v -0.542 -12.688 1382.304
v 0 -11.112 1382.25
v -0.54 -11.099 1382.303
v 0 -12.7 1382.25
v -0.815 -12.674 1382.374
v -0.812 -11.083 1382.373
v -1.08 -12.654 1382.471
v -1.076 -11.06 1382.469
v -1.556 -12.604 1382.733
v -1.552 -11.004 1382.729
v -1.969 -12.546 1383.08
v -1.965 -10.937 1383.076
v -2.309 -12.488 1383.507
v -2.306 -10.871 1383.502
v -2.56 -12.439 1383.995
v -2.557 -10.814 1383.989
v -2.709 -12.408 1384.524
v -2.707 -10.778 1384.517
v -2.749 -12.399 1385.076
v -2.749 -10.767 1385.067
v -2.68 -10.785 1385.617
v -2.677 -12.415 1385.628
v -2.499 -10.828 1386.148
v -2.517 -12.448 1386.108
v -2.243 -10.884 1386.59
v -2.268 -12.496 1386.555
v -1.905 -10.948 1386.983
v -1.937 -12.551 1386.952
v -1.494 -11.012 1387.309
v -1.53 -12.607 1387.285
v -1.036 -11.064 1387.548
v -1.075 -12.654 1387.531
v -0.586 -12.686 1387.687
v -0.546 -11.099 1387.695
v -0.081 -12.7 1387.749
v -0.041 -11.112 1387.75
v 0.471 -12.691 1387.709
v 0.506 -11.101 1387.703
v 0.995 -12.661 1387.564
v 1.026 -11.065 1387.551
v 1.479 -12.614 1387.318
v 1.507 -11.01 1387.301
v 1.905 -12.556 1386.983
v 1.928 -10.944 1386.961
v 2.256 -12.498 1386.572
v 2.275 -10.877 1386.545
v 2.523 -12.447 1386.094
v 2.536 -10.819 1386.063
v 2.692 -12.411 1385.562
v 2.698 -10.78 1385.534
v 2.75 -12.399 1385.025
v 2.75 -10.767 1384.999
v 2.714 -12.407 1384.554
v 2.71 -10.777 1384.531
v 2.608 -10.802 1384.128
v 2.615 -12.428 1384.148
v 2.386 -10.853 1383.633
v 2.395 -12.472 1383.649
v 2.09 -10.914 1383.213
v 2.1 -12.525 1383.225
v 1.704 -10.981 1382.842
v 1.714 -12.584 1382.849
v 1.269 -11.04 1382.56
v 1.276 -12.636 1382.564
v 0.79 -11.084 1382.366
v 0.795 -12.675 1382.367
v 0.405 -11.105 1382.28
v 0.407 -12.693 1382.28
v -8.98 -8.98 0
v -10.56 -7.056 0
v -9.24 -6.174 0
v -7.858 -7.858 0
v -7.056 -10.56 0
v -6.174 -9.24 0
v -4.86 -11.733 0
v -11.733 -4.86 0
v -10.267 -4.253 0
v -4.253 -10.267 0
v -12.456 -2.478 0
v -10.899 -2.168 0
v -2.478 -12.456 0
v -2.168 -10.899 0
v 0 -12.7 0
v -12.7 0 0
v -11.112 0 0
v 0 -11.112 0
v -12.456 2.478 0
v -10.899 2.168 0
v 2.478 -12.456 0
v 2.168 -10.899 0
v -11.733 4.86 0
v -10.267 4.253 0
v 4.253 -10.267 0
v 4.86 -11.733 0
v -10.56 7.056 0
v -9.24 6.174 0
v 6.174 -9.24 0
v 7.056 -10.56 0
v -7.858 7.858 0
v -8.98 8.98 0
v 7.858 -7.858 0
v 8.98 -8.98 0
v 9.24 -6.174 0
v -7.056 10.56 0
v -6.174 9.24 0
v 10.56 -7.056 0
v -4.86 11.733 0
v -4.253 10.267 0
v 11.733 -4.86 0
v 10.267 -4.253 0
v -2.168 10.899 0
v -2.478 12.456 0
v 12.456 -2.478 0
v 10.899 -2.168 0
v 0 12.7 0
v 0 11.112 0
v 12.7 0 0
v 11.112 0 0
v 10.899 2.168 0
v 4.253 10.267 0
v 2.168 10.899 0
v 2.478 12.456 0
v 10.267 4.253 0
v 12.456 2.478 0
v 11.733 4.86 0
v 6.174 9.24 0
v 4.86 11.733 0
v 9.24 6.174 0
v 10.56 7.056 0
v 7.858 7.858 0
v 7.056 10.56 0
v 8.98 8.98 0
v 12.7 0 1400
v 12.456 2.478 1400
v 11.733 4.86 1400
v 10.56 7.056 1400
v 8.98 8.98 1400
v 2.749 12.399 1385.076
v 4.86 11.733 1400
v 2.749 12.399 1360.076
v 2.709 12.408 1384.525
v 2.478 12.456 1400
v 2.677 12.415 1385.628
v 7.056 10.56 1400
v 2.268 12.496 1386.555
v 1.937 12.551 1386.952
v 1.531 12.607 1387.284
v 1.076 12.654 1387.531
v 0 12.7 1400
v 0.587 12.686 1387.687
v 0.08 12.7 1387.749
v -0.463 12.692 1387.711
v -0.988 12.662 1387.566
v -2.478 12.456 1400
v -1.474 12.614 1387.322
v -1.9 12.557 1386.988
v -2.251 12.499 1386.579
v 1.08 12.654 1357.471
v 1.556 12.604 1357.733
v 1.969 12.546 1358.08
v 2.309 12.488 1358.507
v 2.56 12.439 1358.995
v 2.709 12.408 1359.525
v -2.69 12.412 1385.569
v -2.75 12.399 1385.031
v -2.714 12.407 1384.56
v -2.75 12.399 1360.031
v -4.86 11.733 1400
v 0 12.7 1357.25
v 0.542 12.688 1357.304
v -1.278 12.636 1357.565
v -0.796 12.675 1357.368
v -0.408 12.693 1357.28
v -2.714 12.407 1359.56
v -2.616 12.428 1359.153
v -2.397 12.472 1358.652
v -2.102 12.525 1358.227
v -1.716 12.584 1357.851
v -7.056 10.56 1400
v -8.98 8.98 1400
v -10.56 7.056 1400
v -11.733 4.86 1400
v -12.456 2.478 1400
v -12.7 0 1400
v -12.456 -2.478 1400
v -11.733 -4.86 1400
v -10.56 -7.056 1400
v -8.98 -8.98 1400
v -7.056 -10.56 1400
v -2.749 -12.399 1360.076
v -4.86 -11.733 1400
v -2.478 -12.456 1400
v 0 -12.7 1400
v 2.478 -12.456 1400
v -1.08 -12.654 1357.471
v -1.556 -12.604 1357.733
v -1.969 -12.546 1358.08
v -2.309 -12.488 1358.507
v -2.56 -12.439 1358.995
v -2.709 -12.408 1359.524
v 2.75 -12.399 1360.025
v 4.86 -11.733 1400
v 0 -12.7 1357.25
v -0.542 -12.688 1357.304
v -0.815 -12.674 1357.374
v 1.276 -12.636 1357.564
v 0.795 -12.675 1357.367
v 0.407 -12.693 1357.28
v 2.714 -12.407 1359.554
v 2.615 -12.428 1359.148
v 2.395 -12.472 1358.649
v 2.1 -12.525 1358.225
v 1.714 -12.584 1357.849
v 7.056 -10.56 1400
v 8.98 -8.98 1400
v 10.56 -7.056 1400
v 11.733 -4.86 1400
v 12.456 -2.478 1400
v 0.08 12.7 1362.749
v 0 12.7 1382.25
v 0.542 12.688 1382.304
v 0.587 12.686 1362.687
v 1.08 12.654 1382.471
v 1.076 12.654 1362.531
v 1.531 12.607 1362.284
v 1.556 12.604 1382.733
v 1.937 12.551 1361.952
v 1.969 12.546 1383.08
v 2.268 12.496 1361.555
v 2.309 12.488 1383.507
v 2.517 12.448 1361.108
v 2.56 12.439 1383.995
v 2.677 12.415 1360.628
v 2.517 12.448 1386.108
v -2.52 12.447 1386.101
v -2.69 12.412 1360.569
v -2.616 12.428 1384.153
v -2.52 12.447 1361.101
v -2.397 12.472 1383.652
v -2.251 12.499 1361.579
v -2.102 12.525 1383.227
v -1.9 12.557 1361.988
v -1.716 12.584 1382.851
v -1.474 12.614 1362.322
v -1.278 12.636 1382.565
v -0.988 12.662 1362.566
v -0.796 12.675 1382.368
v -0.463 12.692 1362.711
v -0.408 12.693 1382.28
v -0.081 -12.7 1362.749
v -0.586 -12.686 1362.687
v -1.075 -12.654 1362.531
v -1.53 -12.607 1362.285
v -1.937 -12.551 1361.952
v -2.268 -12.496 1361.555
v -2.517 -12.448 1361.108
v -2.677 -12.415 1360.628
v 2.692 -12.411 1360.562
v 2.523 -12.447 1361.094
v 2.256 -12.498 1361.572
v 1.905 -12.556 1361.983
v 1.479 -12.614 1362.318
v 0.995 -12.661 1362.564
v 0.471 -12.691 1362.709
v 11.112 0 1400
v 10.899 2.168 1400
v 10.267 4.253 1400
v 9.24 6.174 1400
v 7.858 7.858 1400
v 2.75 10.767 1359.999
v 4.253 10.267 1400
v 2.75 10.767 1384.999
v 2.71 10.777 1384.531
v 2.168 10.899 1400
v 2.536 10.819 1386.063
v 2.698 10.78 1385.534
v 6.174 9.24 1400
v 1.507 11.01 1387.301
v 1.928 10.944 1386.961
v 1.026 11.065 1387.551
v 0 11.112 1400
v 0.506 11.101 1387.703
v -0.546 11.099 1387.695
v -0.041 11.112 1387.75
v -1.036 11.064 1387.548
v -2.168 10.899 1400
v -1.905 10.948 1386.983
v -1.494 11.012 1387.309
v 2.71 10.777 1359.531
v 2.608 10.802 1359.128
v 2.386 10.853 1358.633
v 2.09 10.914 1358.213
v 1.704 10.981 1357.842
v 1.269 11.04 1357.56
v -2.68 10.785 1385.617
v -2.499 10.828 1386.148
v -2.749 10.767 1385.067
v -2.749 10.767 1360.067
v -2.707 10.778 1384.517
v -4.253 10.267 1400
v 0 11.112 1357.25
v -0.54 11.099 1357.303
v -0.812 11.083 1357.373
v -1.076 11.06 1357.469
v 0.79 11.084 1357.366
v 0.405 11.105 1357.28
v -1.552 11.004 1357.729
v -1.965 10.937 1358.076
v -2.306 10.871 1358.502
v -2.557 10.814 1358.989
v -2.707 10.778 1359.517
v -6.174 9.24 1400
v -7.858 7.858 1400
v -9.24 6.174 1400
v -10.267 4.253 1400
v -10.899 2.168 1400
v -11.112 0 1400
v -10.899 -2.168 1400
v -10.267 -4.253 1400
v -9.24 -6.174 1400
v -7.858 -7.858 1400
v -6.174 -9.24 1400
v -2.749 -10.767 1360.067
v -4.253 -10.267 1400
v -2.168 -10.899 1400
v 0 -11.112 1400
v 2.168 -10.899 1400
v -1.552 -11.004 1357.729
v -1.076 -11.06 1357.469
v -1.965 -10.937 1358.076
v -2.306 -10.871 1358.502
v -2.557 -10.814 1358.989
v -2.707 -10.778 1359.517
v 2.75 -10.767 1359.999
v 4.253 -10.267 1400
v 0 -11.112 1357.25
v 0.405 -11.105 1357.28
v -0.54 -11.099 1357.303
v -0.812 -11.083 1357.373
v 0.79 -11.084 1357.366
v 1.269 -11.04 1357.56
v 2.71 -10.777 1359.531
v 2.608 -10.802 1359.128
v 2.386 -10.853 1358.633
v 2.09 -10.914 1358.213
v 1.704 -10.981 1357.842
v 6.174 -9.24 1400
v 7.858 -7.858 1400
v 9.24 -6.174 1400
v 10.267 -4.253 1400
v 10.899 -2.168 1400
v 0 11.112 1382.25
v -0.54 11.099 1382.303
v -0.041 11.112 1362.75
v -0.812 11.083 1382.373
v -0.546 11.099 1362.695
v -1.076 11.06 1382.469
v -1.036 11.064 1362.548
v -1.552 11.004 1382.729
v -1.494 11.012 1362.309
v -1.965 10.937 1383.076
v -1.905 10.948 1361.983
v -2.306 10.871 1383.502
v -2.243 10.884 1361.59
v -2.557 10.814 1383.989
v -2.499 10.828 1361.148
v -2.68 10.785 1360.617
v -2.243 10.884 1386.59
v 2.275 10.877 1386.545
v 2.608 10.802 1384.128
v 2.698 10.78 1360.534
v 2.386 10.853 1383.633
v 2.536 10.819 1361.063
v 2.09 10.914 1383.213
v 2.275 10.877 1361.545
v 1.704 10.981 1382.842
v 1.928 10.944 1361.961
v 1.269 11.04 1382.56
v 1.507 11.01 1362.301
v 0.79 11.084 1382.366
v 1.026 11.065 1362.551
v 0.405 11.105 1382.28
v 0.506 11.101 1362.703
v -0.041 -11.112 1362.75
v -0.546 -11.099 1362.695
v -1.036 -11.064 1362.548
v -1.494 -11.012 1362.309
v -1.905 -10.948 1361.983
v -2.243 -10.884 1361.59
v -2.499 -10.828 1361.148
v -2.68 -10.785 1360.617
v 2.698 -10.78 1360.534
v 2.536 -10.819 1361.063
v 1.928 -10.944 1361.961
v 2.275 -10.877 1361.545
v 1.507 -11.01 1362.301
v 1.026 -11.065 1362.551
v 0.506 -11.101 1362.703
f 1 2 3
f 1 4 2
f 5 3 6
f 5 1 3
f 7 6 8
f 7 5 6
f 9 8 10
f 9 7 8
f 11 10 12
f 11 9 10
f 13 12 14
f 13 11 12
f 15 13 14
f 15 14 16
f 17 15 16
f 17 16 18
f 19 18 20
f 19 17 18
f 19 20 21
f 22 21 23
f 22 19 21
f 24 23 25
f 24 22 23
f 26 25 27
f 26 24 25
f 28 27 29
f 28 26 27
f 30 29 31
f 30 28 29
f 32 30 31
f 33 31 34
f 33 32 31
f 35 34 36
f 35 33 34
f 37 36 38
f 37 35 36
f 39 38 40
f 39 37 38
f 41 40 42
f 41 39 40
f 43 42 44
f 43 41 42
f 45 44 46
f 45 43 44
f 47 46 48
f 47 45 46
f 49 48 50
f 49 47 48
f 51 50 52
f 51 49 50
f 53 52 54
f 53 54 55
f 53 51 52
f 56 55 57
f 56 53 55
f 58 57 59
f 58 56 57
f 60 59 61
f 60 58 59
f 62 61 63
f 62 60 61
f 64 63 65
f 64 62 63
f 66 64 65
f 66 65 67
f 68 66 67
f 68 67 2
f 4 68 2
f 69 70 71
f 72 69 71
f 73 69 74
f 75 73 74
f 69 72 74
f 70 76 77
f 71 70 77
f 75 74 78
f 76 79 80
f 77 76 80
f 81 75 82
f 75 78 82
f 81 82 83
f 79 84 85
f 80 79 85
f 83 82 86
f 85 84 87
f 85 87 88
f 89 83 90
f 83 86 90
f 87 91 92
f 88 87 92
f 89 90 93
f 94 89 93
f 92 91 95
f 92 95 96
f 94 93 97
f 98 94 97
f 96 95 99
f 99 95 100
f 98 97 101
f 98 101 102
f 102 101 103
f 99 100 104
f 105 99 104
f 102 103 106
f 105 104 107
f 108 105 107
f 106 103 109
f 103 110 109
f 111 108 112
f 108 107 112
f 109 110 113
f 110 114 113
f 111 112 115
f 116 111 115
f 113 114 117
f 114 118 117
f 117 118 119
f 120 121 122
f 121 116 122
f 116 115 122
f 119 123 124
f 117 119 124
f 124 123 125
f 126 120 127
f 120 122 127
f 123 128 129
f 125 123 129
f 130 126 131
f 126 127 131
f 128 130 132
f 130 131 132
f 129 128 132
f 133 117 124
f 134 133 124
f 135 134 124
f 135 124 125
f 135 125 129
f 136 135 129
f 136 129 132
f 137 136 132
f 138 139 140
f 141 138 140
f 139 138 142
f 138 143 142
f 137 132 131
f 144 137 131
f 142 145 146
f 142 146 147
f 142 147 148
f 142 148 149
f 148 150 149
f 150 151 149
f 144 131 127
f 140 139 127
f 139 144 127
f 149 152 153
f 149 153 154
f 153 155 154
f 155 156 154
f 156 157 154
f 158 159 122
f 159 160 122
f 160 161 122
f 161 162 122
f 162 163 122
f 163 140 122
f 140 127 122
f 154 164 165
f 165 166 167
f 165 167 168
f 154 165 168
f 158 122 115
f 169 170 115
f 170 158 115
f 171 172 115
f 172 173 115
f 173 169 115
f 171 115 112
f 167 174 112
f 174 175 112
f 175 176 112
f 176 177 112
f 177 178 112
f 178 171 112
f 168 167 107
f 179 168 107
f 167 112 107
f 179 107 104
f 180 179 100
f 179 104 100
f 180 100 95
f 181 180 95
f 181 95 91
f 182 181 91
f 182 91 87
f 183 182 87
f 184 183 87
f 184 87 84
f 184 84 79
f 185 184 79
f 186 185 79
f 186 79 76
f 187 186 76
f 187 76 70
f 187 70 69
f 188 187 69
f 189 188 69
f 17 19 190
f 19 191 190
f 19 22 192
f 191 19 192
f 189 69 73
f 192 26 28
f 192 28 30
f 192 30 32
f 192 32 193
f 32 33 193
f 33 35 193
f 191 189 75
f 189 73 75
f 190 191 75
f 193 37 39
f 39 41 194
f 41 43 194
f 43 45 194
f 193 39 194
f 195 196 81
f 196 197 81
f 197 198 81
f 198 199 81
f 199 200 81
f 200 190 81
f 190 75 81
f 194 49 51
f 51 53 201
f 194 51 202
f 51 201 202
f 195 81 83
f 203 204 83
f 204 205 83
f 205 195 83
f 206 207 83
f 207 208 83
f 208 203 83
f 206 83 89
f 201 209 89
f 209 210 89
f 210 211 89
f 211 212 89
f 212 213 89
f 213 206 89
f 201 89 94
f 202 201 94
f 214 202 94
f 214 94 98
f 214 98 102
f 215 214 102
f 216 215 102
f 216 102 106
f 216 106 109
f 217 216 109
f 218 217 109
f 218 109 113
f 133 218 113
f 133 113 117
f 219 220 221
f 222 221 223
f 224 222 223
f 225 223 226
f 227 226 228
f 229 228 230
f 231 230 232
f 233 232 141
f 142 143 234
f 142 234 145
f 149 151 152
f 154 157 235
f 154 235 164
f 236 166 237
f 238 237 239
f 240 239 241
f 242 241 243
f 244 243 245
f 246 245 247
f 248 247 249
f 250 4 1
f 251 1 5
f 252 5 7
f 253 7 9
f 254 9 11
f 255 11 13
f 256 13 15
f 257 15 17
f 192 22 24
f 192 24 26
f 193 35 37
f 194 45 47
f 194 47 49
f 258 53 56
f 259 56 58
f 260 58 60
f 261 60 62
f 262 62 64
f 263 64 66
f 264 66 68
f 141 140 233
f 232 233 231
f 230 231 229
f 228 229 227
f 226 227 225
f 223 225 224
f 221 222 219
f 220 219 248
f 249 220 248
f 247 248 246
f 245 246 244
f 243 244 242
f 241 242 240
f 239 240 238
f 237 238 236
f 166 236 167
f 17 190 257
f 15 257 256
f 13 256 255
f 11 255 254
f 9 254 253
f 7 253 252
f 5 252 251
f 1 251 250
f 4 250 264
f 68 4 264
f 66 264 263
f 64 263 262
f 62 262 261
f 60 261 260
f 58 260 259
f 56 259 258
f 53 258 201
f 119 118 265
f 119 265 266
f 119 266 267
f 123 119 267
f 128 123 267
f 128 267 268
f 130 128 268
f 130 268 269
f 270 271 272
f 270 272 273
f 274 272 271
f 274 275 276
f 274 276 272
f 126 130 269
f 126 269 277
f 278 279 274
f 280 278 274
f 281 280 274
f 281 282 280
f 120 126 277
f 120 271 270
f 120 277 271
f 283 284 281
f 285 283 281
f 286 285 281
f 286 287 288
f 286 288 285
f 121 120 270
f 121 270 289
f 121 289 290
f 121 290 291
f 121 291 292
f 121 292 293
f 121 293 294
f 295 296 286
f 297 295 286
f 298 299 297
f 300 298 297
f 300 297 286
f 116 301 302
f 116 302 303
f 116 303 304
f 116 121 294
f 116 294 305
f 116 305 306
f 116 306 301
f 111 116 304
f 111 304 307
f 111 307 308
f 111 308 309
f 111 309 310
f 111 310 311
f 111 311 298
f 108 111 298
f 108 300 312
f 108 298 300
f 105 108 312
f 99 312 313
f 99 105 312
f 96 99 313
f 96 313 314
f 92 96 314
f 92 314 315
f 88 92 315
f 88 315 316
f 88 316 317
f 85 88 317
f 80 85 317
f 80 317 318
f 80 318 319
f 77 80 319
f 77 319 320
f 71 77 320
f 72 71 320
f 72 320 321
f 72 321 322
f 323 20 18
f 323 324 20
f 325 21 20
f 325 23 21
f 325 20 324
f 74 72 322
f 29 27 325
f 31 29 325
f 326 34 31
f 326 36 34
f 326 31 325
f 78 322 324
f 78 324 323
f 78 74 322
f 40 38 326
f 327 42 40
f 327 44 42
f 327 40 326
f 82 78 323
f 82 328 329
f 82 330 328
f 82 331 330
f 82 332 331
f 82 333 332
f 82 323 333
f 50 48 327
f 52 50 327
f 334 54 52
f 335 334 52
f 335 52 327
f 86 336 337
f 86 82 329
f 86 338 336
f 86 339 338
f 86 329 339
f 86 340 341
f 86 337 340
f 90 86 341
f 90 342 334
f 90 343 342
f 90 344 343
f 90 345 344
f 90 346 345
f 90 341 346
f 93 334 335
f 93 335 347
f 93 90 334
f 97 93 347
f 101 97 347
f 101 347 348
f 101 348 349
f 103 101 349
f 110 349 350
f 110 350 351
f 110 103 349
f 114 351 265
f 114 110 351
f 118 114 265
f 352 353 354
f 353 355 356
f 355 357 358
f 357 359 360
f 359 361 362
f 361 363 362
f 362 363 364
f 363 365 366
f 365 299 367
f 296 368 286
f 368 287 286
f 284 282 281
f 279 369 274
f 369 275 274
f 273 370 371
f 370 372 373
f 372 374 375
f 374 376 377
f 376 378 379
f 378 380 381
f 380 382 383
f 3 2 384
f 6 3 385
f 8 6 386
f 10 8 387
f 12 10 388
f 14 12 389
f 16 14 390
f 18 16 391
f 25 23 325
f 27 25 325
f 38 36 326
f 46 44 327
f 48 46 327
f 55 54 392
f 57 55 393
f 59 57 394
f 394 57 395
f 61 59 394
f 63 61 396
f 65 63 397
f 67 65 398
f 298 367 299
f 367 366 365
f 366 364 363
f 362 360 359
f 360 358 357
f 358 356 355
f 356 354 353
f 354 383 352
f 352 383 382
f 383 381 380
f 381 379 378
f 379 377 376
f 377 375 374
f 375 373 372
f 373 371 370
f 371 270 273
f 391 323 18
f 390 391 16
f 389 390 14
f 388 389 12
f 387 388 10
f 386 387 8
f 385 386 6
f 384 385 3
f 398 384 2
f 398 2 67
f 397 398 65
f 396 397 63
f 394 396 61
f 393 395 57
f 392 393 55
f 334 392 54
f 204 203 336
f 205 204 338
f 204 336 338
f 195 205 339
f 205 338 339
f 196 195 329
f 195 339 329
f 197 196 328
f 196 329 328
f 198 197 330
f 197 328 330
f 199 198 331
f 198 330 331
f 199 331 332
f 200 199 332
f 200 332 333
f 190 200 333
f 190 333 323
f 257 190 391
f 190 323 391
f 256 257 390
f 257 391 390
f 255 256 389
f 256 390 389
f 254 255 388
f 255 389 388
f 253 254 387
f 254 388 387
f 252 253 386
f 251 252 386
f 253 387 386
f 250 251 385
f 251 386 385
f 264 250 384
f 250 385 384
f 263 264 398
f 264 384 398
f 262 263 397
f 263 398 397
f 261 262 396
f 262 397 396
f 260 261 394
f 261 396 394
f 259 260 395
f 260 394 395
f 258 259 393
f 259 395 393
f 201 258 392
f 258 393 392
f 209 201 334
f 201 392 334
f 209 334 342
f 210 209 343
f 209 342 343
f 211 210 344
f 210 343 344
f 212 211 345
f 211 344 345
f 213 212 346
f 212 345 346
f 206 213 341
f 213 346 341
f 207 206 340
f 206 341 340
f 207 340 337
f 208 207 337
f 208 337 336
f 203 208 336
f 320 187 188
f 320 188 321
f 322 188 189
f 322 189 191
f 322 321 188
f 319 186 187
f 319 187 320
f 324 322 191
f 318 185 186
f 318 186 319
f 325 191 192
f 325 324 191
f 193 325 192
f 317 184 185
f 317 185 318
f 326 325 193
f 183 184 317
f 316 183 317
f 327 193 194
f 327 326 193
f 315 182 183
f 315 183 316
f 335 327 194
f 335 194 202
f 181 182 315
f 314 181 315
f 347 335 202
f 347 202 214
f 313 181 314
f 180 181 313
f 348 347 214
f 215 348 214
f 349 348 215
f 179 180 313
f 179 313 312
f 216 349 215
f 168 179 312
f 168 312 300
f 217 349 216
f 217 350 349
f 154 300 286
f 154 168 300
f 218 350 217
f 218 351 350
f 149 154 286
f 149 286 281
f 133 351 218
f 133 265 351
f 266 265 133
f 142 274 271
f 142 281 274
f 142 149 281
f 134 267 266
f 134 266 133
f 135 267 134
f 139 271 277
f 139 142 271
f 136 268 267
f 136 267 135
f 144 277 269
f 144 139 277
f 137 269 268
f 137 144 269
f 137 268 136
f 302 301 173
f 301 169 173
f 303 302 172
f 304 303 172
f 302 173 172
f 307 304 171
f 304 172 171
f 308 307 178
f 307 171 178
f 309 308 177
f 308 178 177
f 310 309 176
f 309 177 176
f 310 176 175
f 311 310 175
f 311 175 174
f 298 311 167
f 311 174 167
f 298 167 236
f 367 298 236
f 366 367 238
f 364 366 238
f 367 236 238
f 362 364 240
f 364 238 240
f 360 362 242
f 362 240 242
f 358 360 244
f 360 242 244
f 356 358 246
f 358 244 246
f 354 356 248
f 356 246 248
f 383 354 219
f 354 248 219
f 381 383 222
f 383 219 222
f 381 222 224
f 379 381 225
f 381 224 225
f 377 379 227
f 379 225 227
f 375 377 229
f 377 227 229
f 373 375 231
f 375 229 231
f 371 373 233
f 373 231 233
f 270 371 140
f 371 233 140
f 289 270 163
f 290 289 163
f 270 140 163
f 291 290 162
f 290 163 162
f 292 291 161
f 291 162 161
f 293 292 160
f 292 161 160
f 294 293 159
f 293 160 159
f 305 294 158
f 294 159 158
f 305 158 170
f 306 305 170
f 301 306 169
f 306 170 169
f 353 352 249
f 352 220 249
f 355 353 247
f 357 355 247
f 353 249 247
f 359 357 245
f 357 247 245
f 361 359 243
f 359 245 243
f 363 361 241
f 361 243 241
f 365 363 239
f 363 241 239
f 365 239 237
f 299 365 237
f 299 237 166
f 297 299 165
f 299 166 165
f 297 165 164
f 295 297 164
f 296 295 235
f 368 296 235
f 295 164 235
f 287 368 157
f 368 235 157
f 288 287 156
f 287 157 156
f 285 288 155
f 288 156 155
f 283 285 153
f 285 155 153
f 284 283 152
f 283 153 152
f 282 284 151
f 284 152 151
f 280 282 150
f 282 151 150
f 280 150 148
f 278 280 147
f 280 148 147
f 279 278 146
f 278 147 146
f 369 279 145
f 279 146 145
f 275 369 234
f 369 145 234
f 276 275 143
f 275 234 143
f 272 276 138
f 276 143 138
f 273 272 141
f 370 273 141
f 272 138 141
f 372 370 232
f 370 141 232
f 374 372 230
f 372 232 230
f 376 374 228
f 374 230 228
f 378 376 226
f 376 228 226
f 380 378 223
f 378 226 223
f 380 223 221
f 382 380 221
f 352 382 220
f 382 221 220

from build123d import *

# Parameters (mm, degrees)
SKETCH2_R                     = 12.7
SKETCH2_R_2                   = 11.1125
BOSS_EXTRUDE1_DEPTH           = 1400
SKETCH6_W                     = 2.75
SKETCH6_H                     = 12.7
M5_CLEARANCE_HOLE1_AT_2_COUNT = 2
M5_CLEARANCE_HOLE1_AT_2_PITCH = 25
MIRROR1_COPY_1_SKETCH_W       = 2.75
MIRROR1_COPY_1_SKETCH_H       = 12.7


with BuildPart() as part:
    # Sketch2 → Boss-Extrude1 (new body)
    with BuildSketch(Plane.XY):
        Circle(SKETCH2_R)
        Circle(SKETCH2_R_2, mode=Mode.SUBTRACT)
    extrude(amount=BOSS_EXTRUDE1_DEPTH)

    # Sketch6 → M5 Clearance Hole1 (revolve, cut)
    with BuildSketch(Plane(origin=(0, 0, 1385), x_dir=(0, 0, -1), z_dir=(1, 0, 0))):
        with Locations((1.375, 6.35)):
            Rectangle(SKETCH6_W, SKETCH6_H)
    m5_clearance_hole1 = revolve(axis=Axis((0, -6.35, 1385), (0, 1, 0)), mode=Mode.SUBTRACT)

    # M5 Clearance Hole1 at 2: M5 Clearance Hole1 ×2
    with Locations(*[(0, 0, -i * M5_CLEARANCE_HOLE1_AT_2_PITCH) for i in range(1, M5_CLEARANCE_HOLE1_AT_2_COUNT)]):
        add(m5_clearance_hole1, mode=Mode.SUBTRACT)

    # Mirror1: M5 Clearance Hole1 across plane
    add(m5_clearance_hole1.mirror(Plane.ZX), mode=Mode.SUBTRACT)

    # Mirror1 copy 1 sketch → Mirror1 copy 1 (revolve, cut)
    with BuildSketch(Plane(origin=(0, 0, 1360), x_dir=(0, 0, -1), z_dir=(1, 0, 0))):
        with Locations((1.375, -6.35)):
            Rectangle(MIRROR1_COPY_1_SKETCH_W, MIRROR1_COPY_1_SKETCH_H)
    revolve(axis=Axis((0, 6.35, 1360), (0, 1, 0)), mode=Mode.SUBTRACT)


solid = part.part
